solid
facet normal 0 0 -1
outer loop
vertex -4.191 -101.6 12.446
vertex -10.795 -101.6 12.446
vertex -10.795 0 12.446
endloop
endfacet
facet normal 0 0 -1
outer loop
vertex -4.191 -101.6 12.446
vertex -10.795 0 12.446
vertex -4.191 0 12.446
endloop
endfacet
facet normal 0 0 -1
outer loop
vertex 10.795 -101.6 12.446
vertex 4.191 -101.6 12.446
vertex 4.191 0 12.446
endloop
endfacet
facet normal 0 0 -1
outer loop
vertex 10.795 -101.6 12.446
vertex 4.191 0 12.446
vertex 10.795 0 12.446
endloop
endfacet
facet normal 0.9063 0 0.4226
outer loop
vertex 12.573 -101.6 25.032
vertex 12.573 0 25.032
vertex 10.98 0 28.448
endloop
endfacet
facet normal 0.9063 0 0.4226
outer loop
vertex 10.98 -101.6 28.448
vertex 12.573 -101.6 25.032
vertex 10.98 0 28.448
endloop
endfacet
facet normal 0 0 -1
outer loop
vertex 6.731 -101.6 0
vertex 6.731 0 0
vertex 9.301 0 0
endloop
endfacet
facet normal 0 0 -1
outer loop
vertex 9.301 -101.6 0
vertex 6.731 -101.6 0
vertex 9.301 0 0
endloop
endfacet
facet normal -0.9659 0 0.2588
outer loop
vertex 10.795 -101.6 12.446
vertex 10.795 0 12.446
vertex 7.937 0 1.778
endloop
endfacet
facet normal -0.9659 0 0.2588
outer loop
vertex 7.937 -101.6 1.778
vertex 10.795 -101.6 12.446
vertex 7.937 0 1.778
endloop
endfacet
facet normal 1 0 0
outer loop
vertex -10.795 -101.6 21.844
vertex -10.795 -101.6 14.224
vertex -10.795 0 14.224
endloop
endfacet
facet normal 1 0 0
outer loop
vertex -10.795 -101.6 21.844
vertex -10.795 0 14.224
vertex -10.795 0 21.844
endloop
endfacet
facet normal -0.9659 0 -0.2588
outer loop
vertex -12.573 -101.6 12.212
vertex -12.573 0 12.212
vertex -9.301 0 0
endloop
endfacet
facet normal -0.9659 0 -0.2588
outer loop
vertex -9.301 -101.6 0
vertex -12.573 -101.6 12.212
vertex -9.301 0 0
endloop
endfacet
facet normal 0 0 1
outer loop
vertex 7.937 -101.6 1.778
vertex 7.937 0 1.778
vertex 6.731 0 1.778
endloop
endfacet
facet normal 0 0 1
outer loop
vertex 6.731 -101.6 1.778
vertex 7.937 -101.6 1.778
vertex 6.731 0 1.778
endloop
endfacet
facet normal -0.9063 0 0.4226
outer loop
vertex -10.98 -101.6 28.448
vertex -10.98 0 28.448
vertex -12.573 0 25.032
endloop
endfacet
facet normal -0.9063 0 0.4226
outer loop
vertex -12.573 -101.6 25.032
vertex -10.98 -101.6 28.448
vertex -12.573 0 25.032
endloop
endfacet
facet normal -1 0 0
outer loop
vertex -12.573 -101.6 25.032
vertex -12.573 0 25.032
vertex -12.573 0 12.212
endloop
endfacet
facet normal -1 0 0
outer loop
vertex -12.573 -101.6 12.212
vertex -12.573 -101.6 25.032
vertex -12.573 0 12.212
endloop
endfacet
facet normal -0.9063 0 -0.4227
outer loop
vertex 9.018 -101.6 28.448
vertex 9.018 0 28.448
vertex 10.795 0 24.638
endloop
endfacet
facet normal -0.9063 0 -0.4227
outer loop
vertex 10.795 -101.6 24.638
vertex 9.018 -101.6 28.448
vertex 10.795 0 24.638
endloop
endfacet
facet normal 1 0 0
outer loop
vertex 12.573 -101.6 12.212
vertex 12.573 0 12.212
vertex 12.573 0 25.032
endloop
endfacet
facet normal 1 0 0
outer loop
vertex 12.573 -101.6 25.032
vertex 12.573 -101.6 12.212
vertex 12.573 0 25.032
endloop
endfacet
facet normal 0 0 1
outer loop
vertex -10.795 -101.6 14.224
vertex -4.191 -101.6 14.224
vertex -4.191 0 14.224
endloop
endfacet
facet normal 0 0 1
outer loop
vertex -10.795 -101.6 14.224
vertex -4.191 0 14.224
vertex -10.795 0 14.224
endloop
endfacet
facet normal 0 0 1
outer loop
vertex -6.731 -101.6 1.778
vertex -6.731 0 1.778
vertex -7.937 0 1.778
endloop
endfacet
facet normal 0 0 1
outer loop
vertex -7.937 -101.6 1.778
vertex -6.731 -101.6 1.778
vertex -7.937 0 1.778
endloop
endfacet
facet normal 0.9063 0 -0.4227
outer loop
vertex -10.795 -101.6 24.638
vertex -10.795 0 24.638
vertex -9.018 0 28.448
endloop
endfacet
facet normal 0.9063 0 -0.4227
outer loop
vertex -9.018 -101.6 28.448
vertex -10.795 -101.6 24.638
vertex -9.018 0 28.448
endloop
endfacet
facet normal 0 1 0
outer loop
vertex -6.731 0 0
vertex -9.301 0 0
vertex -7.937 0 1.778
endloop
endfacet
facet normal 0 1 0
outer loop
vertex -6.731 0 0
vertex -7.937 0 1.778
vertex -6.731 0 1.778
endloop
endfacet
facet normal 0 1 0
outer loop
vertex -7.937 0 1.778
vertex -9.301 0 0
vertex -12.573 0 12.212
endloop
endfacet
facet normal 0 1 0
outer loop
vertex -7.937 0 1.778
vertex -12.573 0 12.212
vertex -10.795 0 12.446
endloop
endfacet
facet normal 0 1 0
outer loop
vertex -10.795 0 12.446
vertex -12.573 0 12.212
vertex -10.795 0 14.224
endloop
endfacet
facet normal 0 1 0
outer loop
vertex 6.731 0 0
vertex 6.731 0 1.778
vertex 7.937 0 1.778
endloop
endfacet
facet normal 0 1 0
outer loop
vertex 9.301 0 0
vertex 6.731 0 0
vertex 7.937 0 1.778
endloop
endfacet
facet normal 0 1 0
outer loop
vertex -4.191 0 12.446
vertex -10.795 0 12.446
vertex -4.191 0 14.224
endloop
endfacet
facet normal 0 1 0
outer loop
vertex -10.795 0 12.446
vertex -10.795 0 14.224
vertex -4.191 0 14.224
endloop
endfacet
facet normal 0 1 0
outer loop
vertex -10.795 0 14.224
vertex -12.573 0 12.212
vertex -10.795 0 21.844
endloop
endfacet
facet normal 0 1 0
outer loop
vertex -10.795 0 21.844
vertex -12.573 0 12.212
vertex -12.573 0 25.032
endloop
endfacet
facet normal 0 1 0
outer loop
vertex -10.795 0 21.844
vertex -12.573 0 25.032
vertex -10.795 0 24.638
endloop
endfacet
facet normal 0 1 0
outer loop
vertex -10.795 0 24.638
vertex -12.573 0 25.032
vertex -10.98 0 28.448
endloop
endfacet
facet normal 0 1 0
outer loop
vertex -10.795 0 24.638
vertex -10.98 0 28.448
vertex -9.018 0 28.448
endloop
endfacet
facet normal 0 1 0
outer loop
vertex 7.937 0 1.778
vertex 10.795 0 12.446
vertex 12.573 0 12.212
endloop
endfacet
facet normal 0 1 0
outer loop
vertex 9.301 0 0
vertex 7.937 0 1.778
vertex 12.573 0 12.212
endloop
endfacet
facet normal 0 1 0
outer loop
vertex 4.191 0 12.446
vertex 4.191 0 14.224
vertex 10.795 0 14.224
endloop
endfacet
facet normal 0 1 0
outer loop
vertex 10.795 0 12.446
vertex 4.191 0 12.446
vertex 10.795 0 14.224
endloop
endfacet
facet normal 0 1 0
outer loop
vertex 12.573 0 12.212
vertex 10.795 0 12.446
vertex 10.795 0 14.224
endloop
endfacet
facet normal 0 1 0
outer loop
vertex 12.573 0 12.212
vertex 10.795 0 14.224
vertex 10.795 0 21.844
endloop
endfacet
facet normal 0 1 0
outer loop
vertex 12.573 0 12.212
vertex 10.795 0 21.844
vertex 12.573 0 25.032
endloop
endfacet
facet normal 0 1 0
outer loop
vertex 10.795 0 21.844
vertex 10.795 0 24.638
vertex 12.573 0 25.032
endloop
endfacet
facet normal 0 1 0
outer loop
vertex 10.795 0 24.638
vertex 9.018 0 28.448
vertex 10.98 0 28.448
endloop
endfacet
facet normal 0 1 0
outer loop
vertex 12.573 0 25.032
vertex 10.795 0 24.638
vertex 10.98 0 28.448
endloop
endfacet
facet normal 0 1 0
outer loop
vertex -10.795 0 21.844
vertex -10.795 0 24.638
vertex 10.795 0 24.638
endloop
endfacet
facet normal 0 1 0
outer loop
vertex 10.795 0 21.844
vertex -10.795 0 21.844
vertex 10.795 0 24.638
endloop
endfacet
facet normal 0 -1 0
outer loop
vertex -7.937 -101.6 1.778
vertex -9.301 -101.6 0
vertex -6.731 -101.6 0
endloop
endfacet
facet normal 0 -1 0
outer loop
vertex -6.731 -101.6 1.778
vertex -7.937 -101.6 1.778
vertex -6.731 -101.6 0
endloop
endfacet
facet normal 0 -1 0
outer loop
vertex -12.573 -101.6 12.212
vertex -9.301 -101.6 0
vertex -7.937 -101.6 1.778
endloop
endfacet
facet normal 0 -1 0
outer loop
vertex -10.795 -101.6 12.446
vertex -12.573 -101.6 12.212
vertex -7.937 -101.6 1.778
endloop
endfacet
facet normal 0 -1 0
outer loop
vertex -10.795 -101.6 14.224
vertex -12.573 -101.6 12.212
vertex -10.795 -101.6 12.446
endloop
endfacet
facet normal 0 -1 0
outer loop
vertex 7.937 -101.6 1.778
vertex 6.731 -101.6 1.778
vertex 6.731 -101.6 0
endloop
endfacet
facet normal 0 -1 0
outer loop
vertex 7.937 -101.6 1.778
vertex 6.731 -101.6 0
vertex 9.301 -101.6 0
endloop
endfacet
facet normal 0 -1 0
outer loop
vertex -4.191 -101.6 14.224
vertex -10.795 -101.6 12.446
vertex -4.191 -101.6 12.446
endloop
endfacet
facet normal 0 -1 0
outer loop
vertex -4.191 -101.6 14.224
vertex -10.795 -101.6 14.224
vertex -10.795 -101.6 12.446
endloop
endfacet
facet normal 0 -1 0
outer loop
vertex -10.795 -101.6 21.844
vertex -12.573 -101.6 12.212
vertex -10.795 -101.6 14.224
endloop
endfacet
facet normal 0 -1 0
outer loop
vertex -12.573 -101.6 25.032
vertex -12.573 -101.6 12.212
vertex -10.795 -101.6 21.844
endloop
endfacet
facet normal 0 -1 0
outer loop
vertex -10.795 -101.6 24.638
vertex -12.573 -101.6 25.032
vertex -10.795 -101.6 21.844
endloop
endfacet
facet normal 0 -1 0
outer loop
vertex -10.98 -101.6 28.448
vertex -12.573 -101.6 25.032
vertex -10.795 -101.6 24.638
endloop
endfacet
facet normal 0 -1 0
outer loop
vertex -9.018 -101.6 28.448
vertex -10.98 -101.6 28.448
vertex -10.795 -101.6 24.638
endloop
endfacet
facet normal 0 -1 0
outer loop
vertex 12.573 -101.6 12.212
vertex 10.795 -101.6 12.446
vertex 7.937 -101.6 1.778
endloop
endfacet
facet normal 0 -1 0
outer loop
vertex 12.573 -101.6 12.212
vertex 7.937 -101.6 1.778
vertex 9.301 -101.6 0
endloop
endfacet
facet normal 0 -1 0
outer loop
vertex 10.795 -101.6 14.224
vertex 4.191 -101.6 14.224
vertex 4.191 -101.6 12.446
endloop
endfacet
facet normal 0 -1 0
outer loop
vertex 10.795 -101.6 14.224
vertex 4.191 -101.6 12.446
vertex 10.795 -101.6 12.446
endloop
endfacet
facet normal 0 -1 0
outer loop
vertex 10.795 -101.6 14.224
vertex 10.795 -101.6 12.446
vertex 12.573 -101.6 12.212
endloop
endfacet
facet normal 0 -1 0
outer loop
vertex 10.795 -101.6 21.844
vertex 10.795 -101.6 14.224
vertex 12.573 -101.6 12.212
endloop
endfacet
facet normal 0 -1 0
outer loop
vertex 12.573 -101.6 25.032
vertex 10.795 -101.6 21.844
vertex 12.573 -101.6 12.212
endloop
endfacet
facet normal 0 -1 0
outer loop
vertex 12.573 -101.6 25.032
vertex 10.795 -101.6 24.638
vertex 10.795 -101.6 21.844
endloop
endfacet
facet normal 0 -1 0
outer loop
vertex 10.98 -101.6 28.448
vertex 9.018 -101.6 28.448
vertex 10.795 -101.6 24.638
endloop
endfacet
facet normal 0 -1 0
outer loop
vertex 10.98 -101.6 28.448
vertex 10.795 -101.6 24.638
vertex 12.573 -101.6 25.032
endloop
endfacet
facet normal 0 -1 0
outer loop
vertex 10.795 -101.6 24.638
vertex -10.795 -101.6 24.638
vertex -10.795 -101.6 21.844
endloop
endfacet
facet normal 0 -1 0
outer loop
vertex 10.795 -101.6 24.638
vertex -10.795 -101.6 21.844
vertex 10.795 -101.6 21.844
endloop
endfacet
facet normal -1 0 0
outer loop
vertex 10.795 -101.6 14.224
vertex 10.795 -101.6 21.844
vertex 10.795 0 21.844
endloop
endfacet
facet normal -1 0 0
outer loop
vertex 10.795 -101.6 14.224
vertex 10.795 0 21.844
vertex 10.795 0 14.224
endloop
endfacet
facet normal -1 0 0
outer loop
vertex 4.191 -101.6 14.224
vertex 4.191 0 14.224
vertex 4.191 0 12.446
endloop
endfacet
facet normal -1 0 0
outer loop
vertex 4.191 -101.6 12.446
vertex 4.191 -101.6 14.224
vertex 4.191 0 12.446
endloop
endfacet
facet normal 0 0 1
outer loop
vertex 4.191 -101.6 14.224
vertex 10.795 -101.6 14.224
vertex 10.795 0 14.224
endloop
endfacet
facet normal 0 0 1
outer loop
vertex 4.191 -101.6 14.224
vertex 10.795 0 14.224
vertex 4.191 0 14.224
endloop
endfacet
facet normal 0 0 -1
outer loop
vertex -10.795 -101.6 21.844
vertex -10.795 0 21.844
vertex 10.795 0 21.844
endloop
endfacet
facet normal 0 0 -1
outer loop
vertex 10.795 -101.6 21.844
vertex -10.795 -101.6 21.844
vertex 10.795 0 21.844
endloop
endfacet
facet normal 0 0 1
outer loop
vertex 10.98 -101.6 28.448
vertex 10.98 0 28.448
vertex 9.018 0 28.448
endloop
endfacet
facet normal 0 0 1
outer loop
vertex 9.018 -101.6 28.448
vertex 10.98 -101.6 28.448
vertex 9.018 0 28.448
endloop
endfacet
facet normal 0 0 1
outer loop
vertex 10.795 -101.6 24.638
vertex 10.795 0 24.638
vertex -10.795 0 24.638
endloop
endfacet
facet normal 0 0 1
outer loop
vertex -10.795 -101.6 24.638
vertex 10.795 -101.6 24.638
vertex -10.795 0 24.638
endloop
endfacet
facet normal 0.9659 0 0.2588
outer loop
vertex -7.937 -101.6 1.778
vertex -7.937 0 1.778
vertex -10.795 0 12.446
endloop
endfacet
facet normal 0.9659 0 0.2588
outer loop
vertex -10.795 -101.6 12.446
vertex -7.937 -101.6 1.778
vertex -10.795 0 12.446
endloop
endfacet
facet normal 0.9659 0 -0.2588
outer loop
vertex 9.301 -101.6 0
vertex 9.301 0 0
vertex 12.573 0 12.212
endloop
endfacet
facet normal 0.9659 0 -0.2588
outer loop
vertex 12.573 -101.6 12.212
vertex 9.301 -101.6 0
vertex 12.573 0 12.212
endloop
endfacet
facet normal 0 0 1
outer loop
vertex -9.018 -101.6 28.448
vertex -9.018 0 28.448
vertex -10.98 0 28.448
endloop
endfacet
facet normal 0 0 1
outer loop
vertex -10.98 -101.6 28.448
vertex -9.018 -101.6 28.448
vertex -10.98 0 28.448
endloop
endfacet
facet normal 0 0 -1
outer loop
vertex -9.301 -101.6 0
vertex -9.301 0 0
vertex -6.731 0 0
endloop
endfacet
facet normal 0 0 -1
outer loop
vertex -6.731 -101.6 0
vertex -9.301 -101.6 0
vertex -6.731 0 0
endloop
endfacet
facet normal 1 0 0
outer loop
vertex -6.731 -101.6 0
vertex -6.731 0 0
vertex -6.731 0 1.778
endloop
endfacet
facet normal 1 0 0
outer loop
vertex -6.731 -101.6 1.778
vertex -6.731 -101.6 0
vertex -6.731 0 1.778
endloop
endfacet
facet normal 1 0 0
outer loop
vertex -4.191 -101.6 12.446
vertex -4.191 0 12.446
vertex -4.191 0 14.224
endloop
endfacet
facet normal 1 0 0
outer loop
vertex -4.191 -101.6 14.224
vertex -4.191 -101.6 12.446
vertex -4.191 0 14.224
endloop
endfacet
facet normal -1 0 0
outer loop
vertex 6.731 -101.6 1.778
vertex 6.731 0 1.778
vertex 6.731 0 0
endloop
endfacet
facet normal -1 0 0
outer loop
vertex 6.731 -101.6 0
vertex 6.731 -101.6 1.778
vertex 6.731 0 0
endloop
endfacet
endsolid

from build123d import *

# Parameters (mm, degrees)
F1_DEPTH = 101.6


with BuildPart() as f1:
    # F0 (on Front) → F1 (new body)
    with BuildSketch(Plane.XZ):
        Polygon((12.573, 25.032173), (10.980174, 28.448), (9.018368, 28.448), (10.795, 24.638), (0, 24.638), (0, 21.844), (10.795, 21.844), (10.795, 14.224), (4.191, 14.224), (4.191, 12.446), (10.795, 12.446), (7.936518, 1.778), (6.731, 1.778), (6.731, 0), (9.300825, 0), (12.573, 12.211922), align=None)
        Polygon((0, 21.844), (0, 24.638), (-10.795, 24.638), (-9.018368, 28.448), (-10.980174, 28.448), (-12.573, 25.032173), (-12.573, 12.211922), (-9.300825, 0), (-6.731, 0), (-6.731, 1.778), (-7.936518, 1.778), (-10.795, 12.446), (-4.191, 12.446), (-4.191, 14.224), (-10.795, 14.224), (-10.795, 21.844), align=None)
    extrude(amount=F1_DEPTH)


solid = f1.part
